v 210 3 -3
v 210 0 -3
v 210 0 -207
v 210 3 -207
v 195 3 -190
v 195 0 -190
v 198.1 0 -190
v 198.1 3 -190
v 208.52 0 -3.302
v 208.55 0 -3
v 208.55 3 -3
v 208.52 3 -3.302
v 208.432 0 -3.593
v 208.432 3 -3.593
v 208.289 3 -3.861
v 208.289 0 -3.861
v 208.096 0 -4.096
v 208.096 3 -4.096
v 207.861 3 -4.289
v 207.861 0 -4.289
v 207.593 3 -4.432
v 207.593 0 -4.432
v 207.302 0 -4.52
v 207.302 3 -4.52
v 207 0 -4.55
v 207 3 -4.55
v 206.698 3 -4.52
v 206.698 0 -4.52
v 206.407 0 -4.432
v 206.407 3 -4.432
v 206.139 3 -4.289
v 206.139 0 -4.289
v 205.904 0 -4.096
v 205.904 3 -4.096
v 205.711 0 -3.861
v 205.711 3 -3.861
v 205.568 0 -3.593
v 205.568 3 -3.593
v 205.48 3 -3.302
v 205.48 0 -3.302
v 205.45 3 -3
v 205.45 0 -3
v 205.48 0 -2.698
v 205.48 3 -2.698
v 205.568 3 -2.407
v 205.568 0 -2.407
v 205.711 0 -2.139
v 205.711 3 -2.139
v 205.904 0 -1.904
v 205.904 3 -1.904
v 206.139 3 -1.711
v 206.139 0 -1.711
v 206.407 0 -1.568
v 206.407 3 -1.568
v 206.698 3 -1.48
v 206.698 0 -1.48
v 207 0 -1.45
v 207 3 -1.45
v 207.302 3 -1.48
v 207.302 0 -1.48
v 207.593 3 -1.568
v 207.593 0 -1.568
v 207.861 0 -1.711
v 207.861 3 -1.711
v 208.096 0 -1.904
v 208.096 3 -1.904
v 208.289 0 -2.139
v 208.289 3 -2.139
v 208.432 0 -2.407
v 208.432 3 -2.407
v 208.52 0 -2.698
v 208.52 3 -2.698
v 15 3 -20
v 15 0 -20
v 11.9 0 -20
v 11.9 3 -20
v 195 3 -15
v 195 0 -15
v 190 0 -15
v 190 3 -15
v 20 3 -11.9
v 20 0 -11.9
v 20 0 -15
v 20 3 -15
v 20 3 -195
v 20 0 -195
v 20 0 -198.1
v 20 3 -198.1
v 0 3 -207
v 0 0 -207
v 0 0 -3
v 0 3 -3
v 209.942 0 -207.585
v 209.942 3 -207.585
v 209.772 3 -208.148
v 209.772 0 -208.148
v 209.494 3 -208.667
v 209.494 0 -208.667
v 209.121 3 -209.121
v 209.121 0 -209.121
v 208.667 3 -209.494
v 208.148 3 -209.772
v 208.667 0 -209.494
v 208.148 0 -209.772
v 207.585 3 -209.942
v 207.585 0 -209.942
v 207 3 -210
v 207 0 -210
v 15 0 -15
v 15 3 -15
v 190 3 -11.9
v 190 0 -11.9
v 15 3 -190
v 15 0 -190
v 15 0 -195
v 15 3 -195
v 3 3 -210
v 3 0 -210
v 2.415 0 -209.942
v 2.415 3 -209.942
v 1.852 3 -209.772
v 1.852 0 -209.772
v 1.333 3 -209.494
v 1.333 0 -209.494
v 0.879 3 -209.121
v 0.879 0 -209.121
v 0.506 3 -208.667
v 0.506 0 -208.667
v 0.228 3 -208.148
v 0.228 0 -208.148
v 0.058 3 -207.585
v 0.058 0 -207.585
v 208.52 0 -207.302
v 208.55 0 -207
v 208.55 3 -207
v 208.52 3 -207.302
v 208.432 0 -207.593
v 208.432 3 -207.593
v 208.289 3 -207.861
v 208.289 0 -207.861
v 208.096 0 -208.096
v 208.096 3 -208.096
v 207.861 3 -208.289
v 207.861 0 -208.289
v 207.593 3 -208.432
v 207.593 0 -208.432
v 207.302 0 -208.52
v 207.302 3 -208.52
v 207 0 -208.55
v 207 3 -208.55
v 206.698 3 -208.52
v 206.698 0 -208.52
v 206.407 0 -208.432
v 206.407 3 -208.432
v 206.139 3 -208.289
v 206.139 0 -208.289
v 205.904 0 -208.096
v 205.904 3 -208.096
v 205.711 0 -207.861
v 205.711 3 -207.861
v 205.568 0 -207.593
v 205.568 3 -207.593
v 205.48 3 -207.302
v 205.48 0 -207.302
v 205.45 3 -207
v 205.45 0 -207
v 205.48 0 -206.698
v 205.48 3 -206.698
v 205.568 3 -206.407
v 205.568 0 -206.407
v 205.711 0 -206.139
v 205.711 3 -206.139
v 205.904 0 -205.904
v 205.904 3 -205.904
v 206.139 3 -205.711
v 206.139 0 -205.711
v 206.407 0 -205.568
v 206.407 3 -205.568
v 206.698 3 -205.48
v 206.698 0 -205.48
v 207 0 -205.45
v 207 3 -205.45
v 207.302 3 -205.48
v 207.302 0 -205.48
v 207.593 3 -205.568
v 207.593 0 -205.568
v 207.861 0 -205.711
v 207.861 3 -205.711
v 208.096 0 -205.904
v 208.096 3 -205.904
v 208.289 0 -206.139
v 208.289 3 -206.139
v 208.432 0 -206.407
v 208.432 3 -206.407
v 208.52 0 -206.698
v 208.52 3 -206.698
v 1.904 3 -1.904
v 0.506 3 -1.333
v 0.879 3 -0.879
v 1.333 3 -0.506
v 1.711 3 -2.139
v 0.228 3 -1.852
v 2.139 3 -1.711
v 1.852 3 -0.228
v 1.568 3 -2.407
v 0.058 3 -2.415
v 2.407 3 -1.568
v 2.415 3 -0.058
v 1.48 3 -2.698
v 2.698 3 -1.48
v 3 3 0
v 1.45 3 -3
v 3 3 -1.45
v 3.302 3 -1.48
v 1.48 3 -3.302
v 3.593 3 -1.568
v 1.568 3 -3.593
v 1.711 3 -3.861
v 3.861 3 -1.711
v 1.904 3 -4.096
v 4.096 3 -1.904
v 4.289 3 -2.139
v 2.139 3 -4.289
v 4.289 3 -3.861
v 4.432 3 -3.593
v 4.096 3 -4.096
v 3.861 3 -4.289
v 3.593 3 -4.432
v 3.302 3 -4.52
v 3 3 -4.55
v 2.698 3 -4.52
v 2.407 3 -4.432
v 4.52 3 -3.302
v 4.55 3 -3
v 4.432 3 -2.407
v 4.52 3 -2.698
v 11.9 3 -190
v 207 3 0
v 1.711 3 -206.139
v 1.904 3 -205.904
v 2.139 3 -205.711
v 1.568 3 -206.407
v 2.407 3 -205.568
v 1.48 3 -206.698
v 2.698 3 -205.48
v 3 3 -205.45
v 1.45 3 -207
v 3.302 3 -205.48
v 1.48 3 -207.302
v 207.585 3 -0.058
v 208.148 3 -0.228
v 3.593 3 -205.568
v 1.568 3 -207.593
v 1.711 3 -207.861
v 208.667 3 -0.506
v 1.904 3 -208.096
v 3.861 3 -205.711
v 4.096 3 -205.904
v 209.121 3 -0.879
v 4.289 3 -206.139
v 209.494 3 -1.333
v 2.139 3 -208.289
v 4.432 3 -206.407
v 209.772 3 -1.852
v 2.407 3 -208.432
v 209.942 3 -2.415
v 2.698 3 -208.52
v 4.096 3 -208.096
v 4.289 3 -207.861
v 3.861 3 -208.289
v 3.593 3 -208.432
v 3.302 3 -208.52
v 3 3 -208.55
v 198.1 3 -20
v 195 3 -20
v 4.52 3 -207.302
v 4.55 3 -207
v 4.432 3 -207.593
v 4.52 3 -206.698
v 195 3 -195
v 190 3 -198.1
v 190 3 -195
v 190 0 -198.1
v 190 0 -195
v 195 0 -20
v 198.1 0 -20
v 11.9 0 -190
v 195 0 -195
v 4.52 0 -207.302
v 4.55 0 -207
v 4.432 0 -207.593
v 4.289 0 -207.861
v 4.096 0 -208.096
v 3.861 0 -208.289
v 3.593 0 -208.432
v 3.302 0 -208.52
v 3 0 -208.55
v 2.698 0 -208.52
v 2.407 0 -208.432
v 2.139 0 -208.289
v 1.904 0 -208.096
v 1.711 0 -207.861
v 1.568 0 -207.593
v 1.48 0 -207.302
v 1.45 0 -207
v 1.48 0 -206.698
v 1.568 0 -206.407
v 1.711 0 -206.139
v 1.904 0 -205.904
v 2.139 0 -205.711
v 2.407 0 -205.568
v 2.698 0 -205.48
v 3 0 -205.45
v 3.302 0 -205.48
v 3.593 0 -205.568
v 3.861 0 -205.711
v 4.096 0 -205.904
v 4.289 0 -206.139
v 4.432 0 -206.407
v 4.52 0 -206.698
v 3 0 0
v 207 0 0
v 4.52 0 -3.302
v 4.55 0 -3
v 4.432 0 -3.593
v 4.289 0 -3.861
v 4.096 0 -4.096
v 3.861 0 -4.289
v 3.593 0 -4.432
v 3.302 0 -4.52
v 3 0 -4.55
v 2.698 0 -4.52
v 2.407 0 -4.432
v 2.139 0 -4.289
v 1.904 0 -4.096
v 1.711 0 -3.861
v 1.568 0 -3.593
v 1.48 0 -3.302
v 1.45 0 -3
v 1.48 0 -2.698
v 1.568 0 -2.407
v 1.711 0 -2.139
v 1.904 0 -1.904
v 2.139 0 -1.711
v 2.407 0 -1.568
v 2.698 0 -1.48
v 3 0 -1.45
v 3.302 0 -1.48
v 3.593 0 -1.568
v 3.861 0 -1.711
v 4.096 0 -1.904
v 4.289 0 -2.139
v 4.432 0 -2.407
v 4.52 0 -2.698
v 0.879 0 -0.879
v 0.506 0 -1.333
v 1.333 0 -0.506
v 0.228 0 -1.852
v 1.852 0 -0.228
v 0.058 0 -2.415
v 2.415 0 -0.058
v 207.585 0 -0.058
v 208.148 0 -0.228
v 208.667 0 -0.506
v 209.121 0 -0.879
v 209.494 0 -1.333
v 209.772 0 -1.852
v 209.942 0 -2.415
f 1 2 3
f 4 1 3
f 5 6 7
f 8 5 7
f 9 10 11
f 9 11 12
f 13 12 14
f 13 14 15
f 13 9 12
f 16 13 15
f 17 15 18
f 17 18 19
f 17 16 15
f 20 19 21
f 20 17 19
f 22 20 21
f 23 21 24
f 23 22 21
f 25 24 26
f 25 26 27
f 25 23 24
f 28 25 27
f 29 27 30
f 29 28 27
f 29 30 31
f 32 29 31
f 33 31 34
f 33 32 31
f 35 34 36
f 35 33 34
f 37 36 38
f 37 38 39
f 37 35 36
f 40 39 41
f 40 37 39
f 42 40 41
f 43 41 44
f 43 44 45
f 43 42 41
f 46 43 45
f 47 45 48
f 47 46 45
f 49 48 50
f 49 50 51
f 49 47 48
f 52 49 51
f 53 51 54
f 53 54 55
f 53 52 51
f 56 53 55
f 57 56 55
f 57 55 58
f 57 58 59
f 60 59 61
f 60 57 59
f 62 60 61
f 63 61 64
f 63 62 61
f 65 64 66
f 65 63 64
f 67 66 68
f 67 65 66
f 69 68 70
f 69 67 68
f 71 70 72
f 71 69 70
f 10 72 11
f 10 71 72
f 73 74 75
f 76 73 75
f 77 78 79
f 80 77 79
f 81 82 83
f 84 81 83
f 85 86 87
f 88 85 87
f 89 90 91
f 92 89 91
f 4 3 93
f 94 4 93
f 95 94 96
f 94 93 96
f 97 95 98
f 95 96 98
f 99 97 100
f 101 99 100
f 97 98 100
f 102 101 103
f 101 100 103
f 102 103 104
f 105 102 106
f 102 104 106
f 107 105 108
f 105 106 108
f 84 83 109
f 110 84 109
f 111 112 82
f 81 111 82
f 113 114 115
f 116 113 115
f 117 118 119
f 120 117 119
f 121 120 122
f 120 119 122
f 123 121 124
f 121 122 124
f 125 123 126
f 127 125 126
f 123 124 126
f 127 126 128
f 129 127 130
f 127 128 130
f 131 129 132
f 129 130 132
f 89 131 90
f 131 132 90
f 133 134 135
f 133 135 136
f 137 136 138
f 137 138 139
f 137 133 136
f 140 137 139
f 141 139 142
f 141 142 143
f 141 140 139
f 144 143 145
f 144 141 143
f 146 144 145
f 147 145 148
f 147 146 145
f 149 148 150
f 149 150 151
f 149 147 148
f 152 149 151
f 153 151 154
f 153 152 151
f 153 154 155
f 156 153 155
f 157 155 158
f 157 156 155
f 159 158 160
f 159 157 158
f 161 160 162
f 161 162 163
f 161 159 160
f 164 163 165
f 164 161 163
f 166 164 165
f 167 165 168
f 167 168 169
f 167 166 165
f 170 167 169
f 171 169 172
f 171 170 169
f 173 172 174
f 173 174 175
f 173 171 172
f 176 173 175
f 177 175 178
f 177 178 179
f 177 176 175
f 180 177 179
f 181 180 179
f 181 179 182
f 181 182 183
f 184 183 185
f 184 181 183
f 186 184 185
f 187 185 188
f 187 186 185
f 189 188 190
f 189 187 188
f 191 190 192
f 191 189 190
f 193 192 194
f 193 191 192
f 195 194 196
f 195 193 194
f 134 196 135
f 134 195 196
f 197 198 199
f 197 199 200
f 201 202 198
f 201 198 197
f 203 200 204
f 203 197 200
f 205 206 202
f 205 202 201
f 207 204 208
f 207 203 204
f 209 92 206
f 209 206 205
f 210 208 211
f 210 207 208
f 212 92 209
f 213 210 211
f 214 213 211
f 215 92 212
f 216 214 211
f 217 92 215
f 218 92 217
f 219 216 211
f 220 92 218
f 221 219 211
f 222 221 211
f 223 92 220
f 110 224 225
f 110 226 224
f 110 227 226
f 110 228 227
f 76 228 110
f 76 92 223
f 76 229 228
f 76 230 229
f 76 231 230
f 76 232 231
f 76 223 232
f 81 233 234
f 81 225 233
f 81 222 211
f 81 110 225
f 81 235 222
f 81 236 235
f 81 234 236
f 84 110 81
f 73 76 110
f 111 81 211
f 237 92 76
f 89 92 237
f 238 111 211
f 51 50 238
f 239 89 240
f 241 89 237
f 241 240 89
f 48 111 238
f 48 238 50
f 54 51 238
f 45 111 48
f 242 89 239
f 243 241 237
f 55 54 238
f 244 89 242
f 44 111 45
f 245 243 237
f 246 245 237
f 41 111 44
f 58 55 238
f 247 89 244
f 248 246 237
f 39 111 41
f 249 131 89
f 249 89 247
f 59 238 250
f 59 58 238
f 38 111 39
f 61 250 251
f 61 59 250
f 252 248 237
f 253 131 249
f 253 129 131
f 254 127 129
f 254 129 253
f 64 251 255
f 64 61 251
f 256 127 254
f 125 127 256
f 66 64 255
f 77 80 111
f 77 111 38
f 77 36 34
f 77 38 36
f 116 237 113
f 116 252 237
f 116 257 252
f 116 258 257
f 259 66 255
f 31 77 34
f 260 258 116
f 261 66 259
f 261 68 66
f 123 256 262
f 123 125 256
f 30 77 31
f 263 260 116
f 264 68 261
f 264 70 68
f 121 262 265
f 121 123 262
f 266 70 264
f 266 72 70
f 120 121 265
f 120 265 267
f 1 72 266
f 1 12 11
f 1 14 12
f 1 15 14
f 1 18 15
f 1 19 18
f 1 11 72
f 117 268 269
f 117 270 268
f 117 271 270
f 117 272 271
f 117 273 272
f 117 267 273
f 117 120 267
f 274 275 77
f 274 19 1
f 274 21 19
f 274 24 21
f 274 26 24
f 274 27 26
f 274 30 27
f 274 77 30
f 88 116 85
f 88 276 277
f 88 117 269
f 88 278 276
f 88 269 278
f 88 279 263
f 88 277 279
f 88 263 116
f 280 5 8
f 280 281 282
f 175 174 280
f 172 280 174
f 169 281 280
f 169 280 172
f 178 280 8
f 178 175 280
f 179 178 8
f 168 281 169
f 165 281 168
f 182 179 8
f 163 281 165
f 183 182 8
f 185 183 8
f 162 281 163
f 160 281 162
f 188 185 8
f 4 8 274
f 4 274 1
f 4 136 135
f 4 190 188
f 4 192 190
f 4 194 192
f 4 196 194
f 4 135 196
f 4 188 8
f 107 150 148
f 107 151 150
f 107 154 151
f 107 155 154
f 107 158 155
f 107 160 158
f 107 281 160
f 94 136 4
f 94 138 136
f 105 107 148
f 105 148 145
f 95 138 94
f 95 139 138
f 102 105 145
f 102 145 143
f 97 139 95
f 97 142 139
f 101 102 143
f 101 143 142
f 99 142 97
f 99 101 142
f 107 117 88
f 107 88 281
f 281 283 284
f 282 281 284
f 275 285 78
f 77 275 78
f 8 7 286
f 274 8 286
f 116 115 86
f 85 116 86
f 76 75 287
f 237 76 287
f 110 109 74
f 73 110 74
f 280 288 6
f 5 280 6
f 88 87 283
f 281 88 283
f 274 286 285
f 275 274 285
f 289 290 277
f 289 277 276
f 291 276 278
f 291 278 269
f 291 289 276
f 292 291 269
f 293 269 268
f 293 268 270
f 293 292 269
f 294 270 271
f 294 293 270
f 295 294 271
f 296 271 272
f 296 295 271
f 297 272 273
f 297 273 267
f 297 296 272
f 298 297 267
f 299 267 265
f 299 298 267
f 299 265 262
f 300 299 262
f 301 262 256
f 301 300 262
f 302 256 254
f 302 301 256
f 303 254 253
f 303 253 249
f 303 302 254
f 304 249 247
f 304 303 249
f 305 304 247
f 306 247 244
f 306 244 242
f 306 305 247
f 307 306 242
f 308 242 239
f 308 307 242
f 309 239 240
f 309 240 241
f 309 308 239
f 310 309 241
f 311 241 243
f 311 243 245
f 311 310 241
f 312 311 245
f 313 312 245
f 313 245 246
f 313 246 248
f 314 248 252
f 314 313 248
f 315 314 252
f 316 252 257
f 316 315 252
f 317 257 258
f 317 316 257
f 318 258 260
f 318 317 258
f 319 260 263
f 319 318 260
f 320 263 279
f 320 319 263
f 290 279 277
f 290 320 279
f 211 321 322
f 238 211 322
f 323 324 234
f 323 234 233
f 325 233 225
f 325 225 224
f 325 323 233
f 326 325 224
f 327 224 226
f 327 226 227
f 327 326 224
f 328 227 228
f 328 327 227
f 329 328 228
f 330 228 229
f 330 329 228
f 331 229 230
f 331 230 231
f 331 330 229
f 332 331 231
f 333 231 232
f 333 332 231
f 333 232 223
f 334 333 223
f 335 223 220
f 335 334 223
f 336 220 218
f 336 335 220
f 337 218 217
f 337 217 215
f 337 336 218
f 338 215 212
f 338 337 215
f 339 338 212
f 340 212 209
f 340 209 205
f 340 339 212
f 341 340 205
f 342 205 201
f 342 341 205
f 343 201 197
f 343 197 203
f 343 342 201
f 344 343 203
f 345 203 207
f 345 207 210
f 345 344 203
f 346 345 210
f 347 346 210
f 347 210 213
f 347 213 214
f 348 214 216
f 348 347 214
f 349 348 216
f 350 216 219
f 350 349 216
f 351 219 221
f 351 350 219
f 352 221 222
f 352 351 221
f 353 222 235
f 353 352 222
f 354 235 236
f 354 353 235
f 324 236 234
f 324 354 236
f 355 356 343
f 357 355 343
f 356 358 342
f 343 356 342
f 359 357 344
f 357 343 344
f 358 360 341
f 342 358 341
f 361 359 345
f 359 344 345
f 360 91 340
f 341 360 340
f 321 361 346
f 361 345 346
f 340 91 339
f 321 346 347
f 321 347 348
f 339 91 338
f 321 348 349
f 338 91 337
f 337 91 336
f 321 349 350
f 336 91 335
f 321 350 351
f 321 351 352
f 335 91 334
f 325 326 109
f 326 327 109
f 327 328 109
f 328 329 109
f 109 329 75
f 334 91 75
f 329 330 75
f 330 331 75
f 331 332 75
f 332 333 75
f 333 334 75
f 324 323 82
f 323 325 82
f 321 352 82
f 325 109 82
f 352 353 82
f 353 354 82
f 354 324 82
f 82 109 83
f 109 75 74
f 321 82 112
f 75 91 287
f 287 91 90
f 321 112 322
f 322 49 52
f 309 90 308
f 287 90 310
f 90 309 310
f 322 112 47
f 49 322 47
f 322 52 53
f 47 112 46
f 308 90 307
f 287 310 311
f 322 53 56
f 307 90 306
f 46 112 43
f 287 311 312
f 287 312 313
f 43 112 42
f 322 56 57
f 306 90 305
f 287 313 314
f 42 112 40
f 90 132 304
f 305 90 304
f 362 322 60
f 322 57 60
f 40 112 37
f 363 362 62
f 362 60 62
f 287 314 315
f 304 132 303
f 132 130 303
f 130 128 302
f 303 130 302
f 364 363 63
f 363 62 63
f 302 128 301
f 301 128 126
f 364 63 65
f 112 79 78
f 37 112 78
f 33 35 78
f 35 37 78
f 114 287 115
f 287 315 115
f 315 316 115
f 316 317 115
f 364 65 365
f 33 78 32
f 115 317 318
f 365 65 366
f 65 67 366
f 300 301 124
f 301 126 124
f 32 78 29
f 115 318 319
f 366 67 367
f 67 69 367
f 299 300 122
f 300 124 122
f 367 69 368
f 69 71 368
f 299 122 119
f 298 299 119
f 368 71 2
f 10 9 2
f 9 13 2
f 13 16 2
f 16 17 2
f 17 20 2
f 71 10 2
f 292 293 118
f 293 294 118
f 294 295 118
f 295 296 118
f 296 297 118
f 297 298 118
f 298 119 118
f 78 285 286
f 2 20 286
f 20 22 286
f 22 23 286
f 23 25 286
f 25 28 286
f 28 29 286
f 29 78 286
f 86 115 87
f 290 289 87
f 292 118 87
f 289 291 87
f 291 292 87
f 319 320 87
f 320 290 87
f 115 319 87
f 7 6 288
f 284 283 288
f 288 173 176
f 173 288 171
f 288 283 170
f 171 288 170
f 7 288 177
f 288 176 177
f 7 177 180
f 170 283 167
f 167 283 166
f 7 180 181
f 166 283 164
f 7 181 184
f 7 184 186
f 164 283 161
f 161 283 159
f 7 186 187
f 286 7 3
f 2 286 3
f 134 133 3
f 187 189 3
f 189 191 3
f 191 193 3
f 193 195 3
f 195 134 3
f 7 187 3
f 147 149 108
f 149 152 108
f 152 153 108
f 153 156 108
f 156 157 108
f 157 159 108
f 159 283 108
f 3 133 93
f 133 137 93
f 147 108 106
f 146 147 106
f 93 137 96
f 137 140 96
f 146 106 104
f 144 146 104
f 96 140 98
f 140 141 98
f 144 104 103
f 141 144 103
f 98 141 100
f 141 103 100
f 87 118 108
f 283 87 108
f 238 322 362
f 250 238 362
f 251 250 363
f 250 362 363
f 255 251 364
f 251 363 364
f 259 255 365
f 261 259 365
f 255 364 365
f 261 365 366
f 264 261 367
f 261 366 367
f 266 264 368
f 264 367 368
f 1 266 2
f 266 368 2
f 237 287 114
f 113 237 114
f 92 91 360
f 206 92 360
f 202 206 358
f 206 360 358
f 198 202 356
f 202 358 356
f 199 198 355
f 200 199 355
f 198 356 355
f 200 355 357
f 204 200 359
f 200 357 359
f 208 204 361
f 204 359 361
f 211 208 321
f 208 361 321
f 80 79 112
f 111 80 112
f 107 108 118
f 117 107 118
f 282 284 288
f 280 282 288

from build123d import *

# Parameters (mm, degrees)
SKETCH_3_R      = 1.55
EXTRUDE_1_DEPTH = 3


with BuildPart() as part:
    # 草图3 → 凸台-拉伸1 (new body)
    with BuildSketch(Plane(origin=(0, 0, 0), x_dir=(1, 0, 0), z_dir=(0, 1, 0))):
        with BuildLine():
            Line((0, 15), (0, 3))
            ThreePointArc((0, 3), (0.878679656, 0.878679656), (3, 0))
            Line((3, 0), (195, 0))
            Line((195, 0), (207, 0))
            ThreePointArc((207, 0), (209.121320344, 0.878679656), (210, 3))
            Line((210, 3), (210, 15))
            Line((210, 15), (210, 207))
            ThreePointArc((210, 207), (209.121320344, 209.121320344), (207, 210))
            Line((207, 210), (195, 210))
            Line((195, 210), (15, 210))
            Line((15, 210), (3, 210))
            ThreePointArc((3, 210), (0.878679656, 209.121320344), (0, 207))
            Line((0, 207), (0, 195))
            Line((0, 195), (0, 15))
        make_face()
        with Locations((3, 3)):
            Circle(SKETCH_3_R, mode=Mode.SUBTRACT)
        with Locations((207, 3)):
            Circle(SKETCH_3_R, mode=Mode.SUBTRACT)
        with Locations((3, 207)):
            Circle(SKETCH_3_R, mode=Mode.SUBTRACT)
        Polygon((192, 195), (195, 195), (195, 190), (198.1, 190), (198.1, 175), (198.1, 35), (198.1, 20), (195, 20), (195, 15), (192, 15), (190, 15), (190, 11.9), (175, 11.9), (35, 11.9), (20, 11.9), (20, 15), (18, 15), (15, 15), (15, 20), (11.9, 20), (11.9, 35), (11.9, 175), (11.9, 190), (15, 190), (15, 195), (18, 195), (20, 195), (20, 198.1), (35, 198.1), (175, 198.1), (190, 198.1), (190, 195), align=None, mode=Mode.SUBTRACT)
        with Locations((207, 207)):
            Circle(SKETCH_3_R, mode=Mode.SUBTRACT)
    extrude(amount=EXTRUDE_1_DEPTH)


solid = part.part
